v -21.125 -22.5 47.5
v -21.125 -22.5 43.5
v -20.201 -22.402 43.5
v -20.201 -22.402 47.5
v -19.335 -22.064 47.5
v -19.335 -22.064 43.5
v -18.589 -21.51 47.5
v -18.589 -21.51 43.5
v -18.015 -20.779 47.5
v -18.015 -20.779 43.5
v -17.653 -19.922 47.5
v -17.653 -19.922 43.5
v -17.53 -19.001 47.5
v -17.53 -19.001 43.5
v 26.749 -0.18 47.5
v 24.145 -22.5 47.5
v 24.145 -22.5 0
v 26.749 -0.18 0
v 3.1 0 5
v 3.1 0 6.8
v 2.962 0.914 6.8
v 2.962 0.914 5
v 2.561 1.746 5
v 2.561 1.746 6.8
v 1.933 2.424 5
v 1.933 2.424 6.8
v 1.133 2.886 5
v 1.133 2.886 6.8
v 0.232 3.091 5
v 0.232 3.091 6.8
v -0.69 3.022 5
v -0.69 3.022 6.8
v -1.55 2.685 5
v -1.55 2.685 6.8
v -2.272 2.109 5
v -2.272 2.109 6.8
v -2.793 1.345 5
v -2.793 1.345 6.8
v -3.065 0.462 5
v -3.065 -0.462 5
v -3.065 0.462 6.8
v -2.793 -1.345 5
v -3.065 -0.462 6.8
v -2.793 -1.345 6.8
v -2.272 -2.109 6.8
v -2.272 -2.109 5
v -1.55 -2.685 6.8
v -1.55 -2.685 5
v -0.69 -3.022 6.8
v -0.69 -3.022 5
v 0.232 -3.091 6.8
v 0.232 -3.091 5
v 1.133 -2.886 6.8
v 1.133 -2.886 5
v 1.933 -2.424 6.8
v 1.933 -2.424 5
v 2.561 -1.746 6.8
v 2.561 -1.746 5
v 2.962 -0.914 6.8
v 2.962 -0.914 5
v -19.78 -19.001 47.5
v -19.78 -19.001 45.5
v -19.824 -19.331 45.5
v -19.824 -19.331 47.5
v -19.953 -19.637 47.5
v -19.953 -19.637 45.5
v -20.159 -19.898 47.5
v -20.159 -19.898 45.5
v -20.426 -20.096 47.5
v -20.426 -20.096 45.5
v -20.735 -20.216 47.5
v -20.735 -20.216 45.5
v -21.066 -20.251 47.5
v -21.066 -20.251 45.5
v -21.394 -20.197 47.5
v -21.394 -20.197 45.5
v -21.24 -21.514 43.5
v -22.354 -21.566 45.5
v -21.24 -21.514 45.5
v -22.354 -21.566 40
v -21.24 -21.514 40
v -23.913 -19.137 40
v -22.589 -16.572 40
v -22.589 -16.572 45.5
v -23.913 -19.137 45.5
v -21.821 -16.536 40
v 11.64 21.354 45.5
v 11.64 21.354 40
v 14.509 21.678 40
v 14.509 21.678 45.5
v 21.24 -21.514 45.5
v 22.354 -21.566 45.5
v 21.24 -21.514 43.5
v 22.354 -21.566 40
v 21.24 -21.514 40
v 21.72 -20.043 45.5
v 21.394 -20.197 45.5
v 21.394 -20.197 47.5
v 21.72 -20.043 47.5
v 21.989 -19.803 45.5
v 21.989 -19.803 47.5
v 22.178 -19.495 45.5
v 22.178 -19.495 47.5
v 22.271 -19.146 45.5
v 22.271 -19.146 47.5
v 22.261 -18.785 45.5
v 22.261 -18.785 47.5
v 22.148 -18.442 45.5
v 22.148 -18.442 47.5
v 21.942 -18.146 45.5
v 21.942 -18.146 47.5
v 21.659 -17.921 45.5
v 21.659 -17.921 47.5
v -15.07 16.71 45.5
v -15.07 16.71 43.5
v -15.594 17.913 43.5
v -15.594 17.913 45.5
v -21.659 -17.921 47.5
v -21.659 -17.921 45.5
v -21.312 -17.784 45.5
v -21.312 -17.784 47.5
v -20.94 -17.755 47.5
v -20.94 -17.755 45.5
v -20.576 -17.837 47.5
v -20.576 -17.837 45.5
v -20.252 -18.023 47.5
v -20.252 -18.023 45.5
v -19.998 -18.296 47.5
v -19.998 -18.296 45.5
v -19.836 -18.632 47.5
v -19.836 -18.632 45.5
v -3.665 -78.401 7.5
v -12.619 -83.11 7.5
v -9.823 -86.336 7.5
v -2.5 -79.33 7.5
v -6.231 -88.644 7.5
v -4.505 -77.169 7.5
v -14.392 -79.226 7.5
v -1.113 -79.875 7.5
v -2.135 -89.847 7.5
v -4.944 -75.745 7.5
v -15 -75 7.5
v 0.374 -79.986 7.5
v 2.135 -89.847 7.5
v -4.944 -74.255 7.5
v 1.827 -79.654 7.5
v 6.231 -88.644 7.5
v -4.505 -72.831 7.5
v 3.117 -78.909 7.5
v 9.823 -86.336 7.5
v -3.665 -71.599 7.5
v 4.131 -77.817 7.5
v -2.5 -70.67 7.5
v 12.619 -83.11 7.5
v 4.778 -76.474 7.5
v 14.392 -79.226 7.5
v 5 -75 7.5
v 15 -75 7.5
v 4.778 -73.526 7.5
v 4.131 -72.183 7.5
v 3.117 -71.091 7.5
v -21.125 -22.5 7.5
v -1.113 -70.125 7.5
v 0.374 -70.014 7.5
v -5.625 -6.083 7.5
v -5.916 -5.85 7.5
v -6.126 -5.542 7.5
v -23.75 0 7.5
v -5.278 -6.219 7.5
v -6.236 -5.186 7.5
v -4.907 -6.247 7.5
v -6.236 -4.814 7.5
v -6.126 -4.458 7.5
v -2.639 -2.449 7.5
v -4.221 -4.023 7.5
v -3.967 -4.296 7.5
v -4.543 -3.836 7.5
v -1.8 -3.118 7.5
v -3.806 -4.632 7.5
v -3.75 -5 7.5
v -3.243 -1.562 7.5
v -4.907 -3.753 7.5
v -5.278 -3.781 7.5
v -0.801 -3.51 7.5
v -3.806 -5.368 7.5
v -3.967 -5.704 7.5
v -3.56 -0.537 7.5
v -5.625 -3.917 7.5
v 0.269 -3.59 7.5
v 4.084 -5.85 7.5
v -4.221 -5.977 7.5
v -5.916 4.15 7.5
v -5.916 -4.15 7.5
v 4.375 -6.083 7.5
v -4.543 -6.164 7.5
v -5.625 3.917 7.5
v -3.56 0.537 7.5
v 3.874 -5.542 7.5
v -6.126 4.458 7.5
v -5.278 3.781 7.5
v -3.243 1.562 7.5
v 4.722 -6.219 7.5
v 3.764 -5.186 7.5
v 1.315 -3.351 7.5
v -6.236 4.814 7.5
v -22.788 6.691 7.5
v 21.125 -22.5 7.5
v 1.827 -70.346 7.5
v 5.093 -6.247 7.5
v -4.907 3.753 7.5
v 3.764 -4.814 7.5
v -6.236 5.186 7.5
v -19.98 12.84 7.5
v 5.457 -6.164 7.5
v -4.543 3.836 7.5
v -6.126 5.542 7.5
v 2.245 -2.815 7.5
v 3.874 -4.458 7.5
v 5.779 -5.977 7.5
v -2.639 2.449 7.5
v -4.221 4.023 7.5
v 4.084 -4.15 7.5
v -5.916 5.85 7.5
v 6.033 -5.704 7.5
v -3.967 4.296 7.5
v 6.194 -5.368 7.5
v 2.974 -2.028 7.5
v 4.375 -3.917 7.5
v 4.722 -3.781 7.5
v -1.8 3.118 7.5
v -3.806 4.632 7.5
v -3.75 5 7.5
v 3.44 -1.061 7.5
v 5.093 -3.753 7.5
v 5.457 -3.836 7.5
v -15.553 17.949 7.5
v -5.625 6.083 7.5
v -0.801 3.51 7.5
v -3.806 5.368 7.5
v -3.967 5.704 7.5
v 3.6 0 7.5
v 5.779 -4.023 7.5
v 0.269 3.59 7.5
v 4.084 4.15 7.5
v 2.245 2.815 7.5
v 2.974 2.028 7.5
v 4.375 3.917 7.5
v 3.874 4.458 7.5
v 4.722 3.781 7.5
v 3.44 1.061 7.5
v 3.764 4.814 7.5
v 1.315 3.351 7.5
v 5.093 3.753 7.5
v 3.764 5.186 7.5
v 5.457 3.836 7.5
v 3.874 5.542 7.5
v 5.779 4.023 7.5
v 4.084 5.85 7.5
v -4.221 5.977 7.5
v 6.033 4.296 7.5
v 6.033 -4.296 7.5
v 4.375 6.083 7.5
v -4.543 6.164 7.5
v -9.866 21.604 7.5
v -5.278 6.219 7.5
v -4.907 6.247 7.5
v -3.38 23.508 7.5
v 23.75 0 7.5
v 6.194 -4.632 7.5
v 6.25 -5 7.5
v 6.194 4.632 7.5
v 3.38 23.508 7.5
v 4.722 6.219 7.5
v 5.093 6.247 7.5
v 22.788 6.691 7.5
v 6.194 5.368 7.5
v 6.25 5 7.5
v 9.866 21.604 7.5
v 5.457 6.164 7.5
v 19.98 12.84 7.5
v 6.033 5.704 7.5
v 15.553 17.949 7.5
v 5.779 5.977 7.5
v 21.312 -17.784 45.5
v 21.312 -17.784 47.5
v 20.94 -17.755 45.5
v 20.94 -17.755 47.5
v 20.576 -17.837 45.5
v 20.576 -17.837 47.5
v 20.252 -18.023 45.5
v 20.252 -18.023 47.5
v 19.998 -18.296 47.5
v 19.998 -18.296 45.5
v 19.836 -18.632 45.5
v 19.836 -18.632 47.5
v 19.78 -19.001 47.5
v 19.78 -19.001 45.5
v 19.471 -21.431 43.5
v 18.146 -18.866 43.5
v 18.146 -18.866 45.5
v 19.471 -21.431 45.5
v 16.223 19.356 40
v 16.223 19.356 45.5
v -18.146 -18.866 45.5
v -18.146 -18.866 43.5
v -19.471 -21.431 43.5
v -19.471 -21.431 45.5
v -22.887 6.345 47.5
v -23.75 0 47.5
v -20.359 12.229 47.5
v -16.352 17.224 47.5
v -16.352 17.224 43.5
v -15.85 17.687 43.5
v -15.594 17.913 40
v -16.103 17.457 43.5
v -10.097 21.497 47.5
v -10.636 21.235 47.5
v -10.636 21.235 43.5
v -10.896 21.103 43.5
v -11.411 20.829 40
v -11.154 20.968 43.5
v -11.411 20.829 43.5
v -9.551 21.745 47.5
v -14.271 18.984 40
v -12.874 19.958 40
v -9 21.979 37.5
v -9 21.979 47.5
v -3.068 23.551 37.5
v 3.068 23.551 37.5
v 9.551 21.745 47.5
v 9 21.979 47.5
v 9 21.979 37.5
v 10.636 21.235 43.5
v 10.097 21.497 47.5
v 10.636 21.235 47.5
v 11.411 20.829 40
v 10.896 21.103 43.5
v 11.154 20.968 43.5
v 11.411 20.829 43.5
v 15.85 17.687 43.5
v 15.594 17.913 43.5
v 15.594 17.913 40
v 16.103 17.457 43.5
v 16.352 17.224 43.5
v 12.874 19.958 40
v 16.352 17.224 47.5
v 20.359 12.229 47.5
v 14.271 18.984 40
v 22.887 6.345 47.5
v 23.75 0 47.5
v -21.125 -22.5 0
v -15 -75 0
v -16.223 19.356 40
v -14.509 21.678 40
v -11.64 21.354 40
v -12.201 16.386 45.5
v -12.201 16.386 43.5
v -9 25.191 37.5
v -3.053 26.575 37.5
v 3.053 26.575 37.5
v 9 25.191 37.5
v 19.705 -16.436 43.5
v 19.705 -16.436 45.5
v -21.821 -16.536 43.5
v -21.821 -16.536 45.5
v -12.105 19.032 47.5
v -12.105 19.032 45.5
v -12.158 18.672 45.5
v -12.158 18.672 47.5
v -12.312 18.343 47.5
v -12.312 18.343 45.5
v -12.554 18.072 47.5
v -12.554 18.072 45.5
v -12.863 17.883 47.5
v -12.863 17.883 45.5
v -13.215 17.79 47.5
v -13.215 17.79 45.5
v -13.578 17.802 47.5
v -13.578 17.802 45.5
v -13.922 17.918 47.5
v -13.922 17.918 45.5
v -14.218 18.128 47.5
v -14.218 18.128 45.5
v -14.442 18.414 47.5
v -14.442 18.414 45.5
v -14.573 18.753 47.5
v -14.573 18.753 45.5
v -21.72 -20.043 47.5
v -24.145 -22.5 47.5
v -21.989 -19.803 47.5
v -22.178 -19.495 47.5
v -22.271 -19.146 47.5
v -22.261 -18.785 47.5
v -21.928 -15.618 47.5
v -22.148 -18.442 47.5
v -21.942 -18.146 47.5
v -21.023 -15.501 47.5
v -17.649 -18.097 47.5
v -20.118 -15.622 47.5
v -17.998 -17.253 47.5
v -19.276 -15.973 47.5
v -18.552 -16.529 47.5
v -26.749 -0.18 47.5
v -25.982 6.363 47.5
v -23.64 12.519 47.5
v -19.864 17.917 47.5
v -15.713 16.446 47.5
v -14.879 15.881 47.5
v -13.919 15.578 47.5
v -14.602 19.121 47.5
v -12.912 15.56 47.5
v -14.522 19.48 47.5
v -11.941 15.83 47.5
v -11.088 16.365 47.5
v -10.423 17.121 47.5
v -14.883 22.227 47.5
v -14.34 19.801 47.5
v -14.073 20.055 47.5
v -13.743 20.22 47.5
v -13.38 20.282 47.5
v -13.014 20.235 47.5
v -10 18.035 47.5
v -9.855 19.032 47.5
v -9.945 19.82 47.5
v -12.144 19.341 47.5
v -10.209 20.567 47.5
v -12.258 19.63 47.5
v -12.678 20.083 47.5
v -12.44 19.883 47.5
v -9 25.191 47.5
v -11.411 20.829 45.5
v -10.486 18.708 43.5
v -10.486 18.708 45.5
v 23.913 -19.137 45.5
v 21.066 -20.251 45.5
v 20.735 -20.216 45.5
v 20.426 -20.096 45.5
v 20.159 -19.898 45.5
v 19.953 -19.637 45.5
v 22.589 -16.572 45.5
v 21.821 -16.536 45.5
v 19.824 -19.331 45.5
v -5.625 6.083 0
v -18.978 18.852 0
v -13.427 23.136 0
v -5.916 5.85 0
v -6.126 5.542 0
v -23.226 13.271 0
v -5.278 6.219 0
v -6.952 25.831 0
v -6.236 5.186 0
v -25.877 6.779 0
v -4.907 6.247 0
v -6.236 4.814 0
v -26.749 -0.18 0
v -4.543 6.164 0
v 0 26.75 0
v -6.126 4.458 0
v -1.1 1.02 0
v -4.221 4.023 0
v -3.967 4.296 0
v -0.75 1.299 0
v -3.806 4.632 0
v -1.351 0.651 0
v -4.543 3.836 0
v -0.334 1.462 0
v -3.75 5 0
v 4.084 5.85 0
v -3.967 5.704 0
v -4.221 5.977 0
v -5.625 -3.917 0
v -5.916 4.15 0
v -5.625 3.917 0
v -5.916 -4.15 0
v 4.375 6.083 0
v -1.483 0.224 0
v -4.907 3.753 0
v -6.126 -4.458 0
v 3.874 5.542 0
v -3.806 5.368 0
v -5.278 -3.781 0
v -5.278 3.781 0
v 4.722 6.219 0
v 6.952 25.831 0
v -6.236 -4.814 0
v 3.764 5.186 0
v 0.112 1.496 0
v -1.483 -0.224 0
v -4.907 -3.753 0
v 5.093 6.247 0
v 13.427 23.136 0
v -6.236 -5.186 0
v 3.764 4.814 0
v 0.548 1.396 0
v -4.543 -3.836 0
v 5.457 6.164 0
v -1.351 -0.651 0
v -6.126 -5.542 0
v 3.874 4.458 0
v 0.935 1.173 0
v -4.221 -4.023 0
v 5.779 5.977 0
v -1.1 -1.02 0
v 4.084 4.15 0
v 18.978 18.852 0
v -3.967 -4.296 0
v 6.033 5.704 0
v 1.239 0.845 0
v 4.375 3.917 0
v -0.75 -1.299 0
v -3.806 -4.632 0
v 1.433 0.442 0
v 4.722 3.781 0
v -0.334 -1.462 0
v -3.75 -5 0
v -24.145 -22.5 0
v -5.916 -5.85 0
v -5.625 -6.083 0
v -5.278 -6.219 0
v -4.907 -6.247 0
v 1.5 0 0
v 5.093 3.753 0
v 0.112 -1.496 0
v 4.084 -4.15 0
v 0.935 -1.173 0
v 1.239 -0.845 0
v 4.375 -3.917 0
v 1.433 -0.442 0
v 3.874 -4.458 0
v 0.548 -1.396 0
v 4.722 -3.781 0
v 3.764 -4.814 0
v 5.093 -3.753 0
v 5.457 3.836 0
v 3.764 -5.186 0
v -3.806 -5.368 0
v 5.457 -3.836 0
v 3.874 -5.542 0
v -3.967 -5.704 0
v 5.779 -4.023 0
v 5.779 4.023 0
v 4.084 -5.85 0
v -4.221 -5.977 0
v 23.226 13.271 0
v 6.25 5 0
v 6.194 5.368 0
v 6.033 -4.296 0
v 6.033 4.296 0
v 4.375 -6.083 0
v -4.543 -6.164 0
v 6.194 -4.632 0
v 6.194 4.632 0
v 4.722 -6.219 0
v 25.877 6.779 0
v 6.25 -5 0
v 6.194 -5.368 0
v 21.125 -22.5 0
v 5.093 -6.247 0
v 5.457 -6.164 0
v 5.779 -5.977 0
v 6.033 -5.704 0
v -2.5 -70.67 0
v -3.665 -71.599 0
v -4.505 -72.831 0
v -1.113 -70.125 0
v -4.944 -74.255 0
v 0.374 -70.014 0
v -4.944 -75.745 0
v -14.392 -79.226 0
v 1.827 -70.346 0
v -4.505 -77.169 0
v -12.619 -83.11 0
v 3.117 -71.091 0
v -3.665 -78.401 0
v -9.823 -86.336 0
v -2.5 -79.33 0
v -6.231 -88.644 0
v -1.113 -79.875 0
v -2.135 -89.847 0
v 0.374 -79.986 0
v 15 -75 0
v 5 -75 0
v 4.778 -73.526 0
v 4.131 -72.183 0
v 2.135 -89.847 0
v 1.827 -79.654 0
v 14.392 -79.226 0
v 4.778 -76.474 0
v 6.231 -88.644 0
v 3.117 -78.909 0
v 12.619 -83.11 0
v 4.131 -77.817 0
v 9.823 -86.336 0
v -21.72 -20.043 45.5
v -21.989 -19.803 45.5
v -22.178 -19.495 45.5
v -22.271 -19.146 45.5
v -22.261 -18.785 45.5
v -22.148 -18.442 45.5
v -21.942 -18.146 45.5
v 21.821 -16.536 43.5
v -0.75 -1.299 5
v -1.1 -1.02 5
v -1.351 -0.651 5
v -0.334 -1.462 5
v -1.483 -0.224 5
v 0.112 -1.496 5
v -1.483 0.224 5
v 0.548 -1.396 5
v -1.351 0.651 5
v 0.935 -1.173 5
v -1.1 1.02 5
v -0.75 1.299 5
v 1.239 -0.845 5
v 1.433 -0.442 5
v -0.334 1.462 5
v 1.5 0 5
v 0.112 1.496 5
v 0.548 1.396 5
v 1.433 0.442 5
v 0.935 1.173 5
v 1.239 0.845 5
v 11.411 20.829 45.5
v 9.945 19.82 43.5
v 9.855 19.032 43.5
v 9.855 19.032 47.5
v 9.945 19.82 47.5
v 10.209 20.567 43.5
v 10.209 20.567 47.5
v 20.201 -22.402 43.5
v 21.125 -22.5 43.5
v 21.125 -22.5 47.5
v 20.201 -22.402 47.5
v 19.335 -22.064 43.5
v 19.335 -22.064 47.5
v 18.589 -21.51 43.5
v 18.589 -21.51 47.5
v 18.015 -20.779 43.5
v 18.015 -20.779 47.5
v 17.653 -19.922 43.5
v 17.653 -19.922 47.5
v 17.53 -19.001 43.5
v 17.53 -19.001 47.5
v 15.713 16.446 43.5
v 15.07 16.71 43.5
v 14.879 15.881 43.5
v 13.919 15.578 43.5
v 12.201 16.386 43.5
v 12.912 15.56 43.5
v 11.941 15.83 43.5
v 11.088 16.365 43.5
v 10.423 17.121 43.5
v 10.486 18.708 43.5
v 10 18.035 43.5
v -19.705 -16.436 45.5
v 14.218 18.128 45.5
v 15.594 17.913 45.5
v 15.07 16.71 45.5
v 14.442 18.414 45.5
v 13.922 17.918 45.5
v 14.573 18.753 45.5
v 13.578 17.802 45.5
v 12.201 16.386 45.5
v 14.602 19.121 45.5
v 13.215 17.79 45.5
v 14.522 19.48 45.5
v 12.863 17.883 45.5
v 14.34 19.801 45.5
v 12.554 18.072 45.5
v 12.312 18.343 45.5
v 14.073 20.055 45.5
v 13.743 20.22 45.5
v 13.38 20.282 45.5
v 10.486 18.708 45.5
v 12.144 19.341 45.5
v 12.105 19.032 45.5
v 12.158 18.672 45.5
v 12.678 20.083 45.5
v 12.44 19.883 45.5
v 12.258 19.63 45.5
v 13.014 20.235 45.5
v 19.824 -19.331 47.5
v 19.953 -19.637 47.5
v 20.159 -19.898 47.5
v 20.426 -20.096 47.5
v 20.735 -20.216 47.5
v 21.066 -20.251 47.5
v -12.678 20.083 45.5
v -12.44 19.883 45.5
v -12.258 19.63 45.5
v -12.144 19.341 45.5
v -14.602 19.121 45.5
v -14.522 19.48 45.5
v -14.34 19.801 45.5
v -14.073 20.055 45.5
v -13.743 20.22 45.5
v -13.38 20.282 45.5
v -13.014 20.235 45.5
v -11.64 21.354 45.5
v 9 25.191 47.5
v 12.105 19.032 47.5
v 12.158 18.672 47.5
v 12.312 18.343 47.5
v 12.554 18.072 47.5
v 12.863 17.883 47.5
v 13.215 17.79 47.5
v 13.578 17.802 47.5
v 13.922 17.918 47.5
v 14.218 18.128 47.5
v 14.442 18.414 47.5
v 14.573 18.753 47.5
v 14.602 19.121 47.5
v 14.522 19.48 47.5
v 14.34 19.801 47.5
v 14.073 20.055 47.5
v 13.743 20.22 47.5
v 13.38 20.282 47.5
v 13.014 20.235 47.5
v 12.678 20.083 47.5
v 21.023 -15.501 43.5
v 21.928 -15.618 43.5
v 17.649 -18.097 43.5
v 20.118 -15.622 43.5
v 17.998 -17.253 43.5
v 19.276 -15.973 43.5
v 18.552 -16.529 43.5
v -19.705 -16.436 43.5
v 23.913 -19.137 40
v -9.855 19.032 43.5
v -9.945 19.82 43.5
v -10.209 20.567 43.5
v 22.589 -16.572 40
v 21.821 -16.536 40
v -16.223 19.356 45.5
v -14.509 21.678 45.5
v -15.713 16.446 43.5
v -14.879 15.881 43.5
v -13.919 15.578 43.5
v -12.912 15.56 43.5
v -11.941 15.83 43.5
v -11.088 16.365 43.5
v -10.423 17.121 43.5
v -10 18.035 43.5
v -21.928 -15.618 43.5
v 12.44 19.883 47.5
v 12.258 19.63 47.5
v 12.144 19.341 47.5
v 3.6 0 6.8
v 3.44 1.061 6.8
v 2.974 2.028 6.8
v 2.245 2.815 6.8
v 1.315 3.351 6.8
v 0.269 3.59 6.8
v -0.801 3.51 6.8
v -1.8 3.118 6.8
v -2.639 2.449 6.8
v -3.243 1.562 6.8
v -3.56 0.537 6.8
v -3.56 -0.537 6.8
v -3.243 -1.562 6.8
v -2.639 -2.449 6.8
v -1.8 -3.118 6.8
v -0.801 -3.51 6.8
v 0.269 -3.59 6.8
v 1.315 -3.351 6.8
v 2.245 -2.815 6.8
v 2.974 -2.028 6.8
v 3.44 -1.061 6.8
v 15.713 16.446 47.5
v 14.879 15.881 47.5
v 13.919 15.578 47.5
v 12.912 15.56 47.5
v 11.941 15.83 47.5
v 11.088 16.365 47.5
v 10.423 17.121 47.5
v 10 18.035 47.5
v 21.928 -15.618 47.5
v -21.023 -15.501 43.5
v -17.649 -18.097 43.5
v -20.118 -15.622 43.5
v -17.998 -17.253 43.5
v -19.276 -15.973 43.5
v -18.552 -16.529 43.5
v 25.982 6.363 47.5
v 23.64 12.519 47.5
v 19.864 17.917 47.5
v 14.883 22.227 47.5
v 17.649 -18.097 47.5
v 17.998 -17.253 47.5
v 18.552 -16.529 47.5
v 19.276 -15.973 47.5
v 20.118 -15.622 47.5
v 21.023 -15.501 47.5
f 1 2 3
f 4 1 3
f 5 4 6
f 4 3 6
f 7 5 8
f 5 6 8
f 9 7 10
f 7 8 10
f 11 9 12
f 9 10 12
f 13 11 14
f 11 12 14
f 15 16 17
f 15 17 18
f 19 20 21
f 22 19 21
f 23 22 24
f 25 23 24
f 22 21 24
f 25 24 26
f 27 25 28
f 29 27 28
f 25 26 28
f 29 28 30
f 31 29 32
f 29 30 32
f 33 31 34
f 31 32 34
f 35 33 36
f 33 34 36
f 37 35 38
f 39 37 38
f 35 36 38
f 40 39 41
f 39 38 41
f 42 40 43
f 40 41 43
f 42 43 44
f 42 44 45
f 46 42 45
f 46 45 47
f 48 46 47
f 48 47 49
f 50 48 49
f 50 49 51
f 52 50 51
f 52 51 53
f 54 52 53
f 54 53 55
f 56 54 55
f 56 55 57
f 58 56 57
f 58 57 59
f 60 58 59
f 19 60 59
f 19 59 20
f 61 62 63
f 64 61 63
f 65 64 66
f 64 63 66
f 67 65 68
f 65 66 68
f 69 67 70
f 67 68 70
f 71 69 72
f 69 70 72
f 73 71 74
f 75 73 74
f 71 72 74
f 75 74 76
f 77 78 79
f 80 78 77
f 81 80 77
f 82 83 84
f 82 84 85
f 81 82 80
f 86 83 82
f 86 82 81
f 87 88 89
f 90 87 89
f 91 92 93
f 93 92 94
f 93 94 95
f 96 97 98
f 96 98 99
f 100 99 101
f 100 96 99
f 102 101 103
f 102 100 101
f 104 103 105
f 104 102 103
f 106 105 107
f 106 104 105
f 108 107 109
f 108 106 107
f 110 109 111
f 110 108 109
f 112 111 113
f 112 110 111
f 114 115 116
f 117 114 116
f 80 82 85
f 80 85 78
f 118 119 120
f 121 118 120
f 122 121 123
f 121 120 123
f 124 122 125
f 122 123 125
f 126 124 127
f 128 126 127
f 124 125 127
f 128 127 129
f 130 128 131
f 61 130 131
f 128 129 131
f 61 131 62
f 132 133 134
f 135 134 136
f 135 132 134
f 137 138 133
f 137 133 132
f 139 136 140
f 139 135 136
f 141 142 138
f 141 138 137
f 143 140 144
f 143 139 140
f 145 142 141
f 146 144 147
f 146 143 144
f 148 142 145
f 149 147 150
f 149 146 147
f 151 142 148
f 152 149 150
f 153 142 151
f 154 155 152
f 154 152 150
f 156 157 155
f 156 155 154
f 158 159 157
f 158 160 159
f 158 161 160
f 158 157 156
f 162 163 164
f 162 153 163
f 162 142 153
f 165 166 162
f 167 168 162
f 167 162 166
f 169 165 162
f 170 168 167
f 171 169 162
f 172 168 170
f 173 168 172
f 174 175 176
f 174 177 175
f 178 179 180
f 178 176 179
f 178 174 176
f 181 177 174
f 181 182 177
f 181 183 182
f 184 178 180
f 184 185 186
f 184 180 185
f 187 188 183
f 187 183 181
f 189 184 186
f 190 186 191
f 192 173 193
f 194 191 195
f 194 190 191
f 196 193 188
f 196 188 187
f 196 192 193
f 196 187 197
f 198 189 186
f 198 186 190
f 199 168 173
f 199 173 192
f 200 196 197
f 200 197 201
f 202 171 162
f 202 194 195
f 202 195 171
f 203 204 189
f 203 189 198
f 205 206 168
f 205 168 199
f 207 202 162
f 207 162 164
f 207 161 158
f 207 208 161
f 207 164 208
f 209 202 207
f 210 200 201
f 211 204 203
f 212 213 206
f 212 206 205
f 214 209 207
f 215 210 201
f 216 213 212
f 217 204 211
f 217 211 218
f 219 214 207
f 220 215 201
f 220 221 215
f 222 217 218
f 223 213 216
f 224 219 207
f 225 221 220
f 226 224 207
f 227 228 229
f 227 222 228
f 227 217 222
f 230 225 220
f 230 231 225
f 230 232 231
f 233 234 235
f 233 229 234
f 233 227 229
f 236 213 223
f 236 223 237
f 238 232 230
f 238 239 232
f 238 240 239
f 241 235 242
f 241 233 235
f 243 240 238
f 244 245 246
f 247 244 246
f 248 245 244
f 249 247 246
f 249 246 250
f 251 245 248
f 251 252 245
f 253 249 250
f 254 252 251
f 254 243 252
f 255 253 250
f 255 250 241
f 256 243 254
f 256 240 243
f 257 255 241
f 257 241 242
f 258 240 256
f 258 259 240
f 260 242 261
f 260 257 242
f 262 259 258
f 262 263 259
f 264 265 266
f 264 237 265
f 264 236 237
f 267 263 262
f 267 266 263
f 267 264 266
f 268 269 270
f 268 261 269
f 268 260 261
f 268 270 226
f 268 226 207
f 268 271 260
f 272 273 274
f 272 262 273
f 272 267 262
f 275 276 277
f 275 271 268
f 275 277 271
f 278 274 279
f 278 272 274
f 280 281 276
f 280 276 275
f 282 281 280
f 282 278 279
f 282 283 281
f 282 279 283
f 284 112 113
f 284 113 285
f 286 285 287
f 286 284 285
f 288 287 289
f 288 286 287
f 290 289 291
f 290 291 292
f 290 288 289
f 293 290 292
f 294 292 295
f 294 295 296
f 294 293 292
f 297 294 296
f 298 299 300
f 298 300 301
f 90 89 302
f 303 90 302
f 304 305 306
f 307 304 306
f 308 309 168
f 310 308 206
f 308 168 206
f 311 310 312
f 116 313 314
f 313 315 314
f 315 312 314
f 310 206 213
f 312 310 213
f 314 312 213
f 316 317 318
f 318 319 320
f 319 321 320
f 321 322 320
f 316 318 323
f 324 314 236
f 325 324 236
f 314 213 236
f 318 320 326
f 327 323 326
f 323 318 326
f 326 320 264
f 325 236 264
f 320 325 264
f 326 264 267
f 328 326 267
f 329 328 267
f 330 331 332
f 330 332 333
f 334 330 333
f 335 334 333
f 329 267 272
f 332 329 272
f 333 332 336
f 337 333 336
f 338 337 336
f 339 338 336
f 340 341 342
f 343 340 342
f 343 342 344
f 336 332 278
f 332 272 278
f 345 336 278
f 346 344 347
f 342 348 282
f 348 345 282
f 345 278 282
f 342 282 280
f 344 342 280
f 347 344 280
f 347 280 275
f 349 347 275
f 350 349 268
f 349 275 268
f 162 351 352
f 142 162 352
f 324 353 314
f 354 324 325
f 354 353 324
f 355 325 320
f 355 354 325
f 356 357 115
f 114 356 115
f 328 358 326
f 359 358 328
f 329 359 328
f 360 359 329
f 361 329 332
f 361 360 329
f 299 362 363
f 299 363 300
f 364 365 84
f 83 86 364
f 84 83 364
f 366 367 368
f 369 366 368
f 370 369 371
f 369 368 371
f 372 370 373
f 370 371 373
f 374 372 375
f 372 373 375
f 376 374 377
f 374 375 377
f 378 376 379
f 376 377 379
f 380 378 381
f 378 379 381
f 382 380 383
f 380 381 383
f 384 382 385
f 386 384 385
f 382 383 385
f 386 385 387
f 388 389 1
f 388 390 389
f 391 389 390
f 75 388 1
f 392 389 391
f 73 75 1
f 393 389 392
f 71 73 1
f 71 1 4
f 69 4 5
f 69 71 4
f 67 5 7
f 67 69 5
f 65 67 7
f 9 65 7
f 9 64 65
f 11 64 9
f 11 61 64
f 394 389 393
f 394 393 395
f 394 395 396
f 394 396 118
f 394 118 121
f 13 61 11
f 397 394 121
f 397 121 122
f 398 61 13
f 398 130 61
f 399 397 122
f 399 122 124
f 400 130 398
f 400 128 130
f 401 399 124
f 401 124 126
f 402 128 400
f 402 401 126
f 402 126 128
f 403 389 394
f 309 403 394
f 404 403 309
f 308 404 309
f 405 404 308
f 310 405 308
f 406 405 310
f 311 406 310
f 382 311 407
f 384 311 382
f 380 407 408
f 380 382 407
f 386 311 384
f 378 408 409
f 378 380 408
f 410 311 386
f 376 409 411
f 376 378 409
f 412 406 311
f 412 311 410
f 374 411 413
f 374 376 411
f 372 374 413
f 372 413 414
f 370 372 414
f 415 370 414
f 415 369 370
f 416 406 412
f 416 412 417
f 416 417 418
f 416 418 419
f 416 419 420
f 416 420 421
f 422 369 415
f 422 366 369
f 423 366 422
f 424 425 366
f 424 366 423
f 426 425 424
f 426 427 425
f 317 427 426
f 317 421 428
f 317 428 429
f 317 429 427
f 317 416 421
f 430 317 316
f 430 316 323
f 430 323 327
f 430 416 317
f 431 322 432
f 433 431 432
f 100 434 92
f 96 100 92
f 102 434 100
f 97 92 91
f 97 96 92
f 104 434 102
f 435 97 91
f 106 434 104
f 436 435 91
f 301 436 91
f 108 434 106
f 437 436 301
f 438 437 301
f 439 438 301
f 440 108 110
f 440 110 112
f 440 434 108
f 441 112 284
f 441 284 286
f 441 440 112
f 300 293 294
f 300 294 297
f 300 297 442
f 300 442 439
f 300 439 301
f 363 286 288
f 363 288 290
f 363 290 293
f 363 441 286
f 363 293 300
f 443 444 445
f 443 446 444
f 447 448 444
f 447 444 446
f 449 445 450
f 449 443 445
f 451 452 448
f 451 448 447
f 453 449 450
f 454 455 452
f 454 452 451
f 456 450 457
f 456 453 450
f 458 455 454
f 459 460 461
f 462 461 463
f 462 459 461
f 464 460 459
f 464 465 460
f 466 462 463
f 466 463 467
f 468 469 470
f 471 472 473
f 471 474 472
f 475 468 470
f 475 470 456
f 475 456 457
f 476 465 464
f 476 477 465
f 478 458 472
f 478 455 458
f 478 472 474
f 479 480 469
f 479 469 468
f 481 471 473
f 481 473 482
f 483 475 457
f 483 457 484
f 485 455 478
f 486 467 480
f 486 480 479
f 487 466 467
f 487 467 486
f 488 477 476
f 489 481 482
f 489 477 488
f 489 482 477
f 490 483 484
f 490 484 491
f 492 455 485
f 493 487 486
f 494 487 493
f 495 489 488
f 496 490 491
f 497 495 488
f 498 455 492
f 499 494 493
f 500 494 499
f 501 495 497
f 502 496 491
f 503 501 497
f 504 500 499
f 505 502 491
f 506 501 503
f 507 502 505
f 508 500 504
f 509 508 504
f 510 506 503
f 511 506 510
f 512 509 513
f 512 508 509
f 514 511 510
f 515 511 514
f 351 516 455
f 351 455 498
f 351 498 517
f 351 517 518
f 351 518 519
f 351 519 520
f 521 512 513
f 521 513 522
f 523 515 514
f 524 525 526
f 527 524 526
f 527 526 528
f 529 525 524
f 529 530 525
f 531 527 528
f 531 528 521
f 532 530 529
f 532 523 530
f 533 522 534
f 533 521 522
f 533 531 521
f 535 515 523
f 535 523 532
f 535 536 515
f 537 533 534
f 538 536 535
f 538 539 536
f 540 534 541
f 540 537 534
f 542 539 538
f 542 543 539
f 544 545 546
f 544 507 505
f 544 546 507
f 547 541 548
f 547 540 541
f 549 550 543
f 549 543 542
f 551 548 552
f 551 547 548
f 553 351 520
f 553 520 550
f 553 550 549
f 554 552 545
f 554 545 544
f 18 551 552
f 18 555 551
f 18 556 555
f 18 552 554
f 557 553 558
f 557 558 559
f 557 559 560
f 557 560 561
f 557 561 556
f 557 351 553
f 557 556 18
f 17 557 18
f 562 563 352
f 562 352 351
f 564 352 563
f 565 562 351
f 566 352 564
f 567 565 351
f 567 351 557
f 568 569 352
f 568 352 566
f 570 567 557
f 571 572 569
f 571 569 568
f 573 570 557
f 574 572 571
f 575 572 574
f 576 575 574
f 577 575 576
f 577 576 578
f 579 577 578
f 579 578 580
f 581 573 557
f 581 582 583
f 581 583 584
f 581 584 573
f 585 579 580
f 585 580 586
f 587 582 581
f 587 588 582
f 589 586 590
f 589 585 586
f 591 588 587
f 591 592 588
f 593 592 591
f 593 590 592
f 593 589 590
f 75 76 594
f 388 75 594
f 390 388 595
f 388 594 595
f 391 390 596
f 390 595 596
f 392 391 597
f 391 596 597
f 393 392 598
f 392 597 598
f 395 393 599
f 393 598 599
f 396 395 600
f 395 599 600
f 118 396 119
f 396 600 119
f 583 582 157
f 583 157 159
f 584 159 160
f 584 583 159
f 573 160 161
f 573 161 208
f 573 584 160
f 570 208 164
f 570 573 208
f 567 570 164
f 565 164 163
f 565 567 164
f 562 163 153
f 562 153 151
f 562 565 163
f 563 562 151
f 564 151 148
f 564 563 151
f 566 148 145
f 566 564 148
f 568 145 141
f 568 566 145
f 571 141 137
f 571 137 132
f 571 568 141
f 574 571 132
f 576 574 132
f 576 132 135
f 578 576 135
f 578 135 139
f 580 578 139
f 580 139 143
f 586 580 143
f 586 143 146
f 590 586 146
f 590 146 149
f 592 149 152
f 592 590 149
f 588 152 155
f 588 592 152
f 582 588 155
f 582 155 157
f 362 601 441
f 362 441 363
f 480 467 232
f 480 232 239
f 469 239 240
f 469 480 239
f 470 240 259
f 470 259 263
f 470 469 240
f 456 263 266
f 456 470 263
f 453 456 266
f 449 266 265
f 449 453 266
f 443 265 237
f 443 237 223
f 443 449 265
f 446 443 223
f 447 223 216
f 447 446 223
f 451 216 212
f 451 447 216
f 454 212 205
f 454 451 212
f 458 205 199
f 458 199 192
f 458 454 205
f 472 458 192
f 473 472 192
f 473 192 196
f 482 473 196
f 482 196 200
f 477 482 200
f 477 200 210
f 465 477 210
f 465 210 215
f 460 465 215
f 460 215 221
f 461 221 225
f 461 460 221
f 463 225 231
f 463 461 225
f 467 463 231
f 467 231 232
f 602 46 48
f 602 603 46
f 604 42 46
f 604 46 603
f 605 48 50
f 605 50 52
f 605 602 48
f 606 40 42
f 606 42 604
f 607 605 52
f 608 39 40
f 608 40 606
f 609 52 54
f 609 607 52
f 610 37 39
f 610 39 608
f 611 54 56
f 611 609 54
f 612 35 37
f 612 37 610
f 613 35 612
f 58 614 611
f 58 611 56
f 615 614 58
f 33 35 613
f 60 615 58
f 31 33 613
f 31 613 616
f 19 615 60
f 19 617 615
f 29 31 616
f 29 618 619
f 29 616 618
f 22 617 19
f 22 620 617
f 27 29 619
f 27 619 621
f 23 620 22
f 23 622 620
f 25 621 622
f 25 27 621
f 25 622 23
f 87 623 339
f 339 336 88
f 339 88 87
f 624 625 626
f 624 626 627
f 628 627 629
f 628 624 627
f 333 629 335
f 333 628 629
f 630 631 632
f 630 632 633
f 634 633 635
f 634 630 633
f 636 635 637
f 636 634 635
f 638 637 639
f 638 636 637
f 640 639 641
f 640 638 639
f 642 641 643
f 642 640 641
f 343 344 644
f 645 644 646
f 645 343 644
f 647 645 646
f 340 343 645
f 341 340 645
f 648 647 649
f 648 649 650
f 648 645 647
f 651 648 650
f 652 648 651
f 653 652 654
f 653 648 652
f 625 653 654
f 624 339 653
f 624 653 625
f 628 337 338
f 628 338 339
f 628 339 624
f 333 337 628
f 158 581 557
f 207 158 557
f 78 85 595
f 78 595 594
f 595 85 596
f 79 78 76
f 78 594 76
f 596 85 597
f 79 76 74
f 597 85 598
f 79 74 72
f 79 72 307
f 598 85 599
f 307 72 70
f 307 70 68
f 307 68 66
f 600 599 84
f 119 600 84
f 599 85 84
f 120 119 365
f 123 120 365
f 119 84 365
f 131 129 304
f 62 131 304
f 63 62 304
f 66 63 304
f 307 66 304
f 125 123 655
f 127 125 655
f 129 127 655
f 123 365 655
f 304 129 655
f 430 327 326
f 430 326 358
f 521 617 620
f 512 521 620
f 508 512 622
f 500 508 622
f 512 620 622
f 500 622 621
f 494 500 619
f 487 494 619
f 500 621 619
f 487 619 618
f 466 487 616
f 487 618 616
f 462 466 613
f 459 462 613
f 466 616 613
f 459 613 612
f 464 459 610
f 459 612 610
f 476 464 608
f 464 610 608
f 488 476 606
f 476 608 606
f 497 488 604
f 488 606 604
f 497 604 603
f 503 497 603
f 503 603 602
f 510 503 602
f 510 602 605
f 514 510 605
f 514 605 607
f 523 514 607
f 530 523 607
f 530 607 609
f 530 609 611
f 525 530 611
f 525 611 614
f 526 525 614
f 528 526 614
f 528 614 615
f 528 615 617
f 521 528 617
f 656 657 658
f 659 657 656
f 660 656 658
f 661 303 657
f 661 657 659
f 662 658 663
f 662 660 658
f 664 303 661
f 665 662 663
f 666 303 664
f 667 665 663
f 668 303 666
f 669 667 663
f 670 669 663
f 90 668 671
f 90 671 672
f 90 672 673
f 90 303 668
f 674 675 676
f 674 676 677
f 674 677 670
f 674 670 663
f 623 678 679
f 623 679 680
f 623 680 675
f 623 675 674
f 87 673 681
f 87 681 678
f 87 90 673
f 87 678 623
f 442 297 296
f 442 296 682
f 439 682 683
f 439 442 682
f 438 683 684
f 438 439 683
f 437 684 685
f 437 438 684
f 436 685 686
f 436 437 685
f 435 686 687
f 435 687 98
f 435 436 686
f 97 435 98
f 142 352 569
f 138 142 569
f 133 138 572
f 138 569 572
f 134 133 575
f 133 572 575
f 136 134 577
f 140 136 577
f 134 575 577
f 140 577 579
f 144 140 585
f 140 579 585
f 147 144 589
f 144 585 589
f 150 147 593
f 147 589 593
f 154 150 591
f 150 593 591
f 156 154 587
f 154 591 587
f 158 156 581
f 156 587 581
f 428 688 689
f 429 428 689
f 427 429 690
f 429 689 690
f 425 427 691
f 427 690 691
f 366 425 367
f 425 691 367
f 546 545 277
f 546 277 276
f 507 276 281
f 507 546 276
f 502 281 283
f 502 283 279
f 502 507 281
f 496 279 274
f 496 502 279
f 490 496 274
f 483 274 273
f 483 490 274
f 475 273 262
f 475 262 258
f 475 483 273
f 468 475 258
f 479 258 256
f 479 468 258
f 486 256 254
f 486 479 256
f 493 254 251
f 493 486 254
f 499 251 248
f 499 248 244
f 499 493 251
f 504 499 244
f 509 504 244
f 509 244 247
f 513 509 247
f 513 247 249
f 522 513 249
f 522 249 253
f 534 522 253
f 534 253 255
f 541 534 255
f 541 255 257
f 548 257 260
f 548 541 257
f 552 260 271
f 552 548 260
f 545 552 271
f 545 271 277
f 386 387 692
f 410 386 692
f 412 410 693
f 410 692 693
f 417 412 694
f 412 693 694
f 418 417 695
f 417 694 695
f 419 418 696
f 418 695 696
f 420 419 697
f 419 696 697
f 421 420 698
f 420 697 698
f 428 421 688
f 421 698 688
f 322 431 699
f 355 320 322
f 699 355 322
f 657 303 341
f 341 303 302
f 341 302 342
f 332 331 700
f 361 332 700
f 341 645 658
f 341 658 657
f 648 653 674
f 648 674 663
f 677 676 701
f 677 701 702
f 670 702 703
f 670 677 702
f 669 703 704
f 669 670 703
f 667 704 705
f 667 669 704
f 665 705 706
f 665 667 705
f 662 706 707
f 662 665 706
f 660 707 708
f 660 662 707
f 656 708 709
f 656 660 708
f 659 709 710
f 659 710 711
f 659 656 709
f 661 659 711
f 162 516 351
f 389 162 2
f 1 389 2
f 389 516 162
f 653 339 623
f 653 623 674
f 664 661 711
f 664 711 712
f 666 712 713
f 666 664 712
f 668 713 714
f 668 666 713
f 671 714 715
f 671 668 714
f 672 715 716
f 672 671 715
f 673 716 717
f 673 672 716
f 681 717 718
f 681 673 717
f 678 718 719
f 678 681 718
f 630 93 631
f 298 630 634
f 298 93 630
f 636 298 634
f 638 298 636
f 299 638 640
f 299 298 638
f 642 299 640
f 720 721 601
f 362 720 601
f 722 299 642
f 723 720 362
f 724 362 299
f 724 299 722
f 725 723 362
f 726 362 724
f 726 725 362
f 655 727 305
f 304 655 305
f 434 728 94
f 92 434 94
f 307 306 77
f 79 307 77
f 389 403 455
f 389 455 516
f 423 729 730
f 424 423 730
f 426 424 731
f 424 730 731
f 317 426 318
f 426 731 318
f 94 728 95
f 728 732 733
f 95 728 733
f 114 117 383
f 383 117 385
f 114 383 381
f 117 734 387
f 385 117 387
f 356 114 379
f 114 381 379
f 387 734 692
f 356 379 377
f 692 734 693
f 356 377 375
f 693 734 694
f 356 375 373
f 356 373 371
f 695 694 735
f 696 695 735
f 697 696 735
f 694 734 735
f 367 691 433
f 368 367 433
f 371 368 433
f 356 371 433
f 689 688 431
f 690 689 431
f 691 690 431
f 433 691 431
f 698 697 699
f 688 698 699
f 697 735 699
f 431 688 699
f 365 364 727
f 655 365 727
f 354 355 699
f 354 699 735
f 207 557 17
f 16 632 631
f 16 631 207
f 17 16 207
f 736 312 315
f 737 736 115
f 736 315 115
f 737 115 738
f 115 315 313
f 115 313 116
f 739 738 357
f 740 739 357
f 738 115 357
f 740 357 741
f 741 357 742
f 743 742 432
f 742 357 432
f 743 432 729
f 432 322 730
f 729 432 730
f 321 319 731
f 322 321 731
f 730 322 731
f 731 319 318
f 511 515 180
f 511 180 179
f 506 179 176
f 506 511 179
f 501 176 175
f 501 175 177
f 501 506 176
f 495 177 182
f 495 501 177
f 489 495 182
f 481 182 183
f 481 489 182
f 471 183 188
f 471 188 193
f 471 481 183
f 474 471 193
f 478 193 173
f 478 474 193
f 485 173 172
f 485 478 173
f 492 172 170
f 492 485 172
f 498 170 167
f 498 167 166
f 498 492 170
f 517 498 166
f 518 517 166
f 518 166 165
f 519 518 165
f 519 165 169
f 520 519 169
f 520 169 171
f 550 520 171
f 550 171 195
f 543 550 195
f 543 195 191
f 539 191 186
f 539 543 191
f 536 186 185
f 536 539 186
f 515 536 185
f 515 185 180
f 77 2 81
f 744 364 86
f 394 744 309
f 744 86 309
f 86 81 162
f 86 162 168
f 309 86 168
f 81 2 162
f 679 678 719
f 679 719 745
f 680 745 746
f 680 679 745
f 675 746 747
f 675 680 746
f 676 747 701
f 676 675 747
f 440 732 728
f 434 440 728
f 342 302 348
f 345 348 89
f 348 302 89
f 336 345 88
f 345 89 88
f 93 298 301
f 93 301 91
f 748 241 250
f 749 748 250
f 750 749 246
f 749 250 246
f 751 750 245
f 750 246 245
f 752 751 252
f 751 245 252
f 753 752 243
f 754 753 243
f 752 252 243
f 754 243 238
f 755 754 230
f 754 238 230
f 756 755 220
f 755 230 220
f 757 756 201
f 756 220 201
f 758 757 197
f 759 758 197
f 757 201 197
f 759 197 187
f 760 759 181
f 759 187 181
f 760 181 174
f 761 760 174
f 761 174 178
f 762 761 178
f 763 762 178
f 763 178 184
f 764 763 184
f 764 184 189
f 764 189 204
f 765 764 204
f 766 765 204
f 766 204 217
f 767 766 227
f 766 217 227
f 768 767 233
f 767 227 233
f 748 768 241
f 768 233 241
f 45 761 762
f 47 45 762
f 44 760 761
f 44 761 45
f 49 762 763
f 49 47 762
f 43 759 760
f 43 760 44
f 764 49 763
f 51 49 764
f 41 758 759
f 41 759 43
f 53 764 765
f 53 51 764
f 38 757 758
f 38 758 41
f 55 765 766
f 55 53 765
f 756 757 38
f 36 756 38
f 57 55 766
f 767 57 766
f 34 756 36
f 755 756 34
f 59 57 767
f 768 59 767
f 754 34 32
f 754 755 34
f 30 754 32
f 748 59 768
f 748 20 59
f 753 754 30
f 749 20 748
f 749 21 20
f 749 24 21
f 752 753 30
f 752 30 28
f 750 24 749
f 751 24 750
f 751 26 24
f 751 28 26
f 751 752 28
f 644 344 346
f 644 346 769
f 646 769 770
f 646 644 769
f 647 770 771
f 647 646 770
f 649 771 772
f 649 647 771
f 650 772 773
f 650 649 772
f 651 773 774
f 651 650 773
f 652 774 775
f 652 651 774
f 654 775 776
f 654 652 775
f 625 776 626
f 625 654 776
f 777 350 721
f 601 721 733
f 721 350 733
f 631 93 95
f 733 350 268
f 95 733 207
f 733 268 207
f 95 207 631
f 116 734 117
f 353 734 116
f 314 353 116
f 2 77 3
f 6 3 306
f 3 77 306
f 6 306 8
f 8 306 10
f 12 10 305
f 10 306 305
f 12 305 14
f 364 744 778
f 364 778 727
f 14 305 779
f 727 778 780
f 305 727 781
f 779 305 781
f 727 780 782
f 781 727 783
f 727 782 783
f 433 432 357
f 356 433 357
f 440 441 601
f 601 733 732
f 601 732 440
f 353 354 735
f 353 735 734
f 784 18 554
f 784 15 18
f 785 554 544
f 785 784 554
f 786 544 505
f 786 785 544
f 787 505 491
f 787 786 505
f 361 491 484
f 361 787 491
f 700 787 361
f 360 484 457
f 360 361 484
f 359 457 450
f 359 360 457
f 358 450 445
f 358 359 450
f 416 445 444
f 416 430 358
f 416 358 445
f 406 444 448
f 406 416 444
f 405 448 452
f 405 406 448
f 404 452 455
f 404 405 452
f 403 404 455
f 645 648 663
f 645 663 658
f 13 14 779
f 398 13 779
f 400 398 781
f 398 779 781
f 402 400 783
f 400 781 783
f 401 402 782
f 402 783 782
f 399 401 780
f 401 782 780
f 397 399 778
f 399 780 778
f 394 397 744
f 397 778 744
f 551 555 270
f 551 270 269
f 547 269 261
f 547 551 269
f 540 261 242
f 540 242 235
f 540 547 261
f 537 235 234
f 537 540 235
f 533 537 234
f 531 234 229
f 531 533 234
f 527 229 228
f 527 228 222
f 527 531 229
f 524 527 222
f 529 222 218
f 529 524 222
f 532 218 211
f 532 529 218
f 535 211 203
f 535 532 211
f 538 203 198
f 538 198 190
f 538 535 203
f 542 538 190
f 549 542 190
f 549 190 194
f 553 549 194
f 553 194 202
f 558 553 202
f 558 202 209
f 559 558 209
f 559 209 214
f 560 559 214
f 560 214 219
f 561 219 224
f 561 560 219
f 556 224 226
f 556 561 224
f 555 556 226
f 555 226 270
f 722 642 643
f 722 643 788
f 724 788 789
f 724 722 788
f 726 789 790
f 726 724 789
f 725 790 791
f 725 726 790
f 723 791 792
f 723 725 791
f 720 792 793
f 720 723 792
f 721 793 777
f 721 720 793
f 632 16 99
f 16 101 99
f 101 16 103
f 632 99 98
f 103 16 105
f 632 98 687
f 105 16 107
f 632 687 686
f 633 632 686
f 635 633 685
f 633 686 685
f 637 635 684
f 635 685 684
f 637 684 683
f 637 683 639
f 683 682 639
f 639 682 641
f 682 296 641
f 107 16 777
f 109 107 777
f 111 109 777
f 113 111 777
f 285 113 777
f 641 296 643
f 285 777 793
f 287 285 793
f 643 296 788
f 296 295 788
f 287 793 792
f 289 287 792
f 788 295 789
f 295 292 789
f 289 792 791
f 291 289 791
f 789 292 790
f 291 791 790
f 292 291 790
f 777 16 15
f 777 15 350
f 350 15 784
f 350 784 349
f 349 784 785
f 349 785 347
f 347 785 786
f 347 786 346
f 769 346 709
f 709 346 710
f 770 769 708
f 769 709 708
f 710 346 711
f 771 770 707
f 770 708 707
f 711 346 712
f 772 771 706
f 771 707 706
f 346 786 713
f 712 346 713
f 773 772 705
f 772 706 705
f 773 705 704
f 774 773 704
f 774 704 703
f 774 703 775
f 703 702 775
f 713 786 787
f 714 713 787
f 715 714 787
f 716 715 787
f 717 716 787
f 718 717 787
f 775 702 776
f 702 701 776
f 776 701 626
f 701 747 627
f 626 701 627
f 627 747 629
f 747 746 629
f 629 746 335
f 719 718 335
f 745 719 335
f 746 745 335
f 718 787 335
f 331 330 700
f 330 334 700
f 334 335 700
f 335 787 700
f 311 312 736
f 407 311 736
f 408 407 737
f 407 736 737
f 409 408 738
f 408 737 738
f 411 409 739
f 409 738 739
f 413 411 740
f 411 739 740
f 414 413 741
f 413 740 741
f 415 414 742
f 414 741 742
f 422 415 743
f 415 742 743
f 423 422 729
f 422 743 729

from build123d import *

# Parameters (mm, degrees)
ESQUISSE1_R                    = 1.25
ESQUISSE1_R_2                  = 5
BOSS_EXTRU_1_DEPTH             = 7.5
BOSS_EXTRU_2_DEPTH             = 40
BOSS_EXTRU_2_DIRECTION_2_REACH = 95.383
ESQUISSE4_W                    = 18
ESQUISSE4_H                    = 12.605144054
ENL_V_MAT_EXTRU_1_DEPTH        = 10
ENL_V_START                    = -7.5
ENL_V_MAT_EXTRU_2_DEPTH        = 7.5
BOSS_EXTRU_3_START             = -4
BOSS_EXTRU_3_DEPTH             = 4
BOSS_EXTRU_4_START             = -2
BOSS_EXTRU_4_DEPTH             = 2
ESQUISSE6_R                    = 1.5
ENL_V_MAT_EXTRU_3_DEPTH        = 10
ESQUISSE7_R                    = 3.1
ENL_V_MAT_EXTRU_4_DEPTH        = 2.5
ESQUISSE8_R                    = 3.6
ENL_V_MAT_EXTRU_5_DEPTH        = 0.7


with BuildPart() as part:
    # Esquisse1 → Boss.-Extru.1 (new body)
    with BuildSketch(Plane.XY):
        with BuildLine():
            ThreePointArc((23.75, 0), (0, 23.75), (-23.75, 0))
            Line((-23.75, 0), (-15, -75))
            ThreePointArc((-15, -75), (0, -90), (15, -75))
            Line((15, -75), (23.75, 0))
        make_face()
        with Locations((-5, 5)):
            Circle(ESQUISSE1_R, mode=Mode.SUBTRACT)
        with Locations((5, 5)):
            Circle(ESQUISSE1_R, mode=Mode.SUBTRACT)
        with Locations((5, -5)):
            Circle(ESQUISSE1_R, mode=Mode.SUBTRACT)
        with Locations((-5, -5)):
            Circle(ESQUISSE1_R, mode=Mode.SUBTRACT)
        with Locations((0, -75)):
            Circle(ESQUISSE1_R_2, mode=Mode.SUBTRACT)
    extrude(amount=BOSS_EXTRU_1_DEPTH)

    # Esquisse2 → Boss.-Extru.2 (add)
    with BuildSketch(Plane.XY.offset(7.5)):
        with BuildLine():
            ThreePointArc((-23.75, 0), (0, 23.75), (23.75, 0))
            Line((23.75, 0), (21.125, -22.5))
            Line((21.125, -22.5), (24.145347662, -22.5))
            Line((24.145347662, -22.5), (26.749397242, -0.17957503))
            ThreePointArc((26.749397242, -0.17957503), (0, 26.75), (-26.749397242, -0.17957503))
            Line((-26.749397242, -0.17957503), (-24.145347662, -22.5))
            Line((-24.145347662, -22.5), (-21.125, -22.5))
            Line((-21.125, -22.5), (-23.75, 0))
        make_face()
    extrude(amount=BOSS_EXTRU_2_DEPTH)

    # Boss.-Extru.2 direction 2: up to this face of the body (flat: up to its plane)
    boss_extru_2_direction_2_end = Plane(part.part.faces().sort_by_distance((0, -28.342449308, 0))[0])
    # Esquisse2 → Boss.-Extru.2 direction 2 (add, up to the picked face)
    with BuildSketch(Plane.XY.offset(7.5), mode=Mode.PRIVATE) as boss_extru_2_direction_2_sk1:
        with BuildLine():
            ThreePointArc((-23.75, 0), (0, 23.75), (23.75, 0))
            Line((23.75, 0), (21.125, -22.5))
            Line((21.125, -22.5), (24.145347662, -22.5))
            Line((24.145347662, -22.5), (26.749397242, -0.17957503))
            ThreePointArc((26.749397242, -0.17957503), (0, 26.75), (-26.749397242, -0.17957503))
            Line((-26.749397242, -0.17957503), (-24.145347662, -22.5))
            Line((-24.145347662, -22.5), (-21.125, -22.5))
            Line((-21.125, -22.5), (-23.75, 0))
        make_face()
    boss_extru_2_direction_2_tool1 = split(extrude(boss_extru_2_direction_2_sk1.sketch, amount=-BOSS_EXTRU_2_DIRECTION_2_REACH, mode=Mode.PRIVATE), bisect_by=boss_extru_2_direction_2_end, keep=Keep.BOTH, mode=Mode.PRIVATE)
    add(boss_extru_2_direction_2_tool1.solids().sort_by(Axis((0, 24.477173, 7.5), (0, 0, -1)))[0])

    # Esquisse4 → Enlèv. mat.-Extru.1 (cut)
    with BuildSketch(Plane.XY.offset(47.5)):
        with Locations((0, 26.75)):
            Rectangle(ESQUISSE4_W, ESQUISSE4_H)
    extrude(amount=-ENL_V_MAT_EXTRU_1_DEPTH, mode=Mode.SUBTRACT)

    # Esquisse5 → Enlèv. mat.-Extru.2 (cut)
    with BuildSketch(Plane.XY.offset(47.5).offset(ENL_V_START)):
        with BuildLine():
            Line((-11.411137634, 20.829028732), (-11.640060124, 21.354079473))
            Line((-11.640060124, 21.354079473), (-14.50858003, 21.678003669))
            Line((-14.50858003, 21.678003669), (-16.223366565, 19.355754657))
            Line((-16.223366565, 19.355754657), (-15.594359578, 17.913080398))
            ThreePointArc((-15.594359578, 17.913080398), (-13.581233692, 19.483649335), (-11.411137634, 20.829028732))
        make_face()
        Polygon((-21.820839715, -16.535659582), (-22.588746921, -16.571688322), (-23.913370218, -19.136587239), (-22.354414246, -21.566194123), (-21.240043834, -21.513909991), align=None)
    enl_v_mat_extru_2 = extrude(amount=ENL_V_MAT_EXTRU_2_DEPTH, mode=Mode.SUBTRACT)

    # Esquisse5<3> → Boss.-Extru.3 (add)
    with BuildSketch(Plane.XY.offset(47.5).offset(BOSS_EXTRU_3_START)):
        with BuildLine():
            ThreePointArc((-10.635661114, 21.235470625), (-11.025272446, 21.035823433), (-11.411137634, 20.829028732))
            Line((-11.411137634, 20.829028732), (-10.486326754, 18.707906265))
            Line((-10.486326754, 18.707906265), (-12.201113289, 16.385657254))
            Line((-12.201113289, 16.385657254), (-15.069633195, 16.70958145))
            Line((-15.069633195, 16.70958145), (-15.594359578, 17.913080398))
            ThreePointArc((-15.594359578, 17.913080398), (-15.976876587, 17.572760584), (-16.351968659, 17.224274178))
            ThreePointArc((-16.351968659, 17.224274178), (-12.416744053, 15.659892813), (-9.854846659, 19.031830461))
            ThreePointArc((-9.854846659, 19.031830461), (-10.055820333, 20.200772417), (-10.635661114, 21.235470625))
        make_face()
        with BuildLine():
            ThreePointArc((-17.529790949, -19.001295206), (-18.895919972, -16.227021489), (-21.927845037, -15.618471111))
            Line((-21.927845037, -15.618471111), (-21.820839715, -16.535659582))
            Line((-21.820839715, -16.535659582), (-19.705167652, -16.436396289))
            Line((-19.705167652, -16.436396289), (-18.14621168, -18.866003173))
            Line((-18.14621168, -18.866003173), (-19.470834977, -21.43090209))
            Line((-19.470834977, -21.43090209), (-21.240043834, -21.513909991))
            Line((-21.240043834, -21.513909991), (-21.125, -22.5))
            ThreePointArc((-21.125, -22.5), (-18.588810785, -21.509604565), (-17.529790949, -19.001295206))
        make_face()
    boss_extru_3 = extrude(amount=BOSS_EXTRU_3_DEPTH)

    # Esquisse5<4> → Boss.-Extru.4 (add)
    with BuildSketch(Plane.XY.offset(47.5).offset(BOSS_EXTRU_4_START)):
        with BuildLine():
            Line((-11.411137634, 20.829028732), (-11.640060124, 21.354079473))
            Line((-11.640060124, 21.354079473), (-14.50858003, 21.678003669))
            Line((-14.50858003, 21.678003669), (-16.223366565, 19.355754657))
            Line((-16.223366565, 19.355754657), (-15.594359578, 17.913080398))
            ThreePointArc((-15.594359578, 17.913080398), (-15.089714795, 18.340201945), (-14.573376801, 18.753111438))
            ThreePointArc((-14.573376801, 18.753111438), (-14.072849168, 20.055047153), (-12.678292605, 20.082913051))
            ThreePointArc((-12.678292605, 20.082913051), (-12.050491046, 20.465780355), (-11.411137634, 20.829028732))
        make_face()
        with BuildLine():
            Line((-10.486326754, 18.707906265), (-11.411137634, 20.829028732))
            ThreePointArc((-11.411137634, 20.829028732), (-12.050491046, 20.465780355), (-12.678292605, 20.082913051))
            ThreePointArc((-12.678292605, 20.082913051), (-12.257533448, 19.630498747), (-12.104846659, 19.031830461))
            ThreePointArc((-12.104846659, 19.031830461), (-13.214601654, 17.789722842), (-14.573376801, 18.753111438))
            ThreePointArc((-14.573376801, 18.753111438), (-15.089714795, 18.340201945), (-15.594359578, 17.913080398))
            Line((-15.594359578, 17.913080398), (-15.069633195, 16.70958145))
            Line((-15.069633195, 16.70958145), (-12.201113289, 16.385657254))
            Line((-12.201113289, 16.385657254), (-10.486326754, 18.707906265))
        make_face()
        with BuildLine():
            Line((-19.705167652, -16.436396289), (-21.820839715, -16.535659582))
            Line((-21.820839715, -16.535659582), (-21.659180538, -17.921309676))
            ThreePointArc((-21.659180538, -17.921309676), (-20.406989611, -17.917497027), (-19.779790949, -19.001295206))
            ThreePointArc((-19.779790949, -19.001295206), (-20.285594046, -20.005621333), (-21.393664499, -20.197161436))
            Line((-21.393664499, -20.197161436), (-21.240043834, -21.513909991))
            Line((-21.240043834, -21.513909991), (-19.470834977, -21.43090209))
            Line((-19.470834977, -21.43090209), (-18.14621168, -18.866003173))
            Line((-18.14621168, -18.866003173), (-19.705167652, -16.436396289))
        make_face()
        with BuildLine():
            Line((-21.659180538, -17.921309676), (-21.820839715, -16.535659582))
            Line((-21.820839715, -16.535659582), (-22.588746921, -16.571688322))
            Line((-22.588746921, -16.571688322), (-23.913370218, -19.136587239))
            Line((-23.913370218, -19.136587239), (-22.354414246, -21.566194123))
            Line((-22.354414246, -21.566194123), (-21.240043834, -21.513909991))
            Line((-21.240043834, -21.513909991), (-21.393664499, -20.197161436))
            ThreePointArc((-21.393664499, -20.197161436), (-22.271369873, -19.14614608), (-21.659180538, -17.921309676))
        make_face()
    boss_extru_4 = extrude(amount=BOSS_EXTRU_4_DEPTH)

    # Symétrie1: Enlèv. mat.-Extru.2, Boss.-Extru.3, Boss.-Extru.4 across plane
    add(enl_v_mat_extru_2.mirror(Plane(origin=(0, 0, 0), x_dir=(0, 0, 1), z_dir=(1, 0, 0))), mode=Mode.SUBTRACT)
    add(boss_extru_3.mirror(Plane(origin=(0, 0, 0), x_dir=(0, 0, 1), z_dir=(1, 0, 0))))
    add(boss_extru_4.mirror(Plane(origin=(0, 0, 0), x_dir=(0, 0, 1), z_dir=(1, 0, 0))))

    # Esquisse6 → Enlèv. mat.-Extru.3 (cut)
    with BuildSketch(Plane.XY.offset(7.5)):
        Circle(ESQUISSE6_R)
    extrude(amount=-ENL_V_MAT_EXTRU_3_DEPTH, mode=Mode.SUBTRACT)

    # Esquisse7 → Enlèv. mat.-Extru.4 (cut)
    with BuildSketch(Plane.XY.offset(7.5)):
        Circle(ESQUISSE7_R)
    extrude(amount=-ENL_V_MAT_EXTRU_4_DEPTH, mode=Mode.SUBTRACT)

    # Esquisse8 → Enlèv. mat.-Extru.5 (cut)
    with BuildSketch(Plane.XY.offset(7.5)):
        Circle(ESQUISSE8_R)
    extrude(amount=-ENL_V_MAT_EXTRU_5_DEPTH, mode=Mode.SUBTRACT)


solid = part.part
